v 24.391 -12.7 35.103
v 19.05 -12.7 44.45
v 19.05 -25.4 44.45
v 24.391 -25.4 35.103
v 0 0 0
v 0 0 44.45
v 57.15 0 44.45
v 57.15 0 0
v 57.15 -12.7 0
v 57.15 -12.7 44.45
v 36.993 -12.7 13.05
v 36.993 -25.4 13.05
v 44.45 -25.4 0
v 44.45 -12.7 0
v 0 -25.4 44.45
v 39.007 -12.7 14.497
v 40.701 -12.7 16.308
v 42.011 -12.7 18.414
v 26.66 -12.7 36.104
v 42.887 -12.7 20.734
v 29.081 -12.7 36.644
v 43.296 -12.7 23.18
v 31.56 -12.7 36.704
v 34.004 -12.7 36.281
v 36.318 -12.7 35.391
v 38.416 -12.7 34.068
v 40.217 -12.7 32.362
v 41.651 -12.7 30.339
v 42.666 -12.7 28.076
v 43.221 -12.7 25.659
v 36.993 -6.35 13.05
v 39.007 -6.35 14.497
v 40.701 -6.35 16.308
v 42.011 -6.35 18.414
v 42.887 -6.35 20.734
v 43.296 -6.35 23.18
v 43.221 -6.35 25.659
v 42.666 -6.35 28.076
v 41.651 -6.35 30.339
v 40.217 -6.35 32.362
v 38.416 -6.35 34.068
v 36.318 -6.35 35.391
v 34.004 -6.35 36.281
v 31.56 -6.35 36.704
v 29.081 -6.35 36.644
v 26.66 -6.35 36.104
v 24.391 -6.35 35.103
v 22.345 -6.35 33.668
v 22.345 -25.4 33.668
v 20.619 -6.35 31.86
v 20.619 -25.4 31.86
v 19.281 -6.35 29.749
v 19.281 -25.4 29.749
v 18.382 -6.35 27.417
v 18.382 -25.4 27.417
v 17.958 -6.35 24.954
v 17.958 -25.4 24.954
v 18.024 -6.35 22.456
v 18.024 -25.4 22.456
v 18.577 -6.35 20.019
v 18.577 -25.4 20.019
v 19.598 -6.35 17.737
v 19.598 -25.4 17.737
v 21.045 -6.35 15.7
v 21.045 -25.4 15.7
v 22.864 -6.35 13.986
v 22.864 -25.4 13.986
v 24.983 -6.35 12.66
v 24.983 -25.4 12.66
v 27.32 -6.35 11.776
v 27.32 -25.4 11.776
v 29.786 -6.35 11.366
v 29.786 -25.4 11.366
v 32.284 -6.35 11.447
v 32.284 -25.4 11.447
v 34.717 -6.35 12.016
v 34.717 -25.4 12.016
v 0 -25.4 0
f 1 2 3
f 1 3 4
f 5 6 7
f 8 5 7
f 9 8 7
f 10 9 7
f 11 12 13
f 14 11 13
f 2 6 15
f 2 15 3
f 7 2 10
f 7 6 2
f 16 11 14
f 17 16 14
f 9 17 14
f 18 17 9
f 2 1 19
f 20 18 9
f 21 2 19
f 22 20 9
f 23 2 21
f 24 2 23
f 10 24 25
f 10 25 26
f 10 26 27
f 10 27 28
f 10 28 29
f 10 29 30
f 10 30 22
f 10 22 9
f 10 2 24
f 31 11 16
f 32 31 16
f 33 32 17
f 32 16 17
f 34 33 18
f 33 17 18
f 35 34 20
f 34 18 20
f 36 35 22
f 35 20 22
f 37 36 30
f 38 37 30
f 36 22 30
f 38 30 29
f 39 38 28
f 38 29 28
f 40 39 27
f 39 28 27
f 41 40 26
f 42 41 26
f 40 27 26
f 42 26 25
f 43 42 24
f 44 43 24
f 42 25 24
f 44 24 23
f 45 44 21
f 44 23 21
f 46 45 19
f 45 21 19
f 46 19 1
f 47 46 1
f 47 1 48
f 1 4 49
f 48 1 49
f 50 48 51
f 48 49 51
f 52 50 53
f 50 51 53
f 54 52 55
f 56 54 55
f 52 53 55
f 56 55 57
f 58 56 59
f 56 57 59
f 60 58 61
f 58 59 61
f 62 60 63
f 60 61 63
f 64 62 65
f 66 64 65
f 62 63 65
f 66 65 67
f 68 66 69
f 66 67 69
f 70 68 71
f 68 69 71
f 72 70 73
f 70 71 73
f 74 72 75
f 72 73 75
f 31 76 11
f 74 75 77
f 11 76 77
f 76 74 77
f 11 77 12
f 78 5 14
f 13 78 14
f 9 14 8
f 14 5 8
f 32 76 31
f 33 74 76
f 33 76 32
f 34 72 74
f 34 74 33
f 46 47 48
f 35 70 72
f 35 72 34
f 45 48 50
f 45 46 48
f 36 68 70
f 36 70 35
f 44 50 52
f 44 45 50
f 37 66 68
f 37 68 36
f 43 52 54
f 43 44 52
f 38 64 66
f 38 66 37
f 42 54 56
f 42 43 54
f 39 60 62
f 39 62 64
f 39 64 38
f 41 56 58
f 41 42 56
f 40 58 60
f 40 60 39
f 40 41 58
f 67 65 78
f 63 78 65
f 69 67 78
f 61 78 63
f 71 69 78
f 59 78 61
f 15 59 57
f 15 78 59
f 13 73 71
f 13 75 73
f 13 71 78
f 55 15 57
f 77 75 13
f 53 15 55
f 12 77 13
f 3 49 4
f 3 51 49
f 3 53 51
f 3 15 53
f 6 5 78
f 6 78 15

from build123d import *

# Parameters (mm, degrees)
F0_W     = 57.15
F0_H     = 44.45
F1_DEPTH = 25.4
F3_DEPTH = 12.7
F4_DEPTH = 19.05


with BuildPart() as f1:
    # F0 (on Front) → F1 (new body)
    with BuildSketch(Plane.XZ):
        with Locations((28.575, 22.225)):
            Rectangle(F0_W, F0_H)
    extrude(amount=F1_DEPTH)

    # F2 (on face) → F3 (cut)
    with BuildSketch(Plane.XZ.offset(25.4)):
        with BuildLine():
            Line((57.15, 44.45), (19.05, 44.45))
            Line((19.05, 44.45), (24.390971, 35.103302))
            ThreePointArc((24.390971, 35.103302), (41.651297, 30.339378), (36.992666, 13.050335))
            Line((36.992666, 13.050335), (44.45, 0))
            Line((44.45, 0), (57.15, 0))
            Line((57.15, 0), (57.15, 44.45))
        make_face()
    extrude(amount=-F3_DEPTH, mode=Mode.SUBTRACT)

    # F2 (on face) → F4 (cut)
    with BuildSketch(Plane.XZ.offset(25.4)):
        with BuildLine():
            ThreePointArc((36.992666, 13.050335), (41.651297, 30.339378), (24.390971, 35.103302))
            Line((24.390971, 35.103302), (36.992666, 13.050335))
        make_face()
        with BuildLine():
            Line((36.992666, 13.050335), (24.390971, 35.103302))
            ThreePointArc((24.390971, 35.103302), (19.597921, 17.737449), (36.992666, 13.050335))
        make_face()
    extrude(amount=-F4_DEPTH, mode=Mode.SUBTRACT)


solid = f1.part
